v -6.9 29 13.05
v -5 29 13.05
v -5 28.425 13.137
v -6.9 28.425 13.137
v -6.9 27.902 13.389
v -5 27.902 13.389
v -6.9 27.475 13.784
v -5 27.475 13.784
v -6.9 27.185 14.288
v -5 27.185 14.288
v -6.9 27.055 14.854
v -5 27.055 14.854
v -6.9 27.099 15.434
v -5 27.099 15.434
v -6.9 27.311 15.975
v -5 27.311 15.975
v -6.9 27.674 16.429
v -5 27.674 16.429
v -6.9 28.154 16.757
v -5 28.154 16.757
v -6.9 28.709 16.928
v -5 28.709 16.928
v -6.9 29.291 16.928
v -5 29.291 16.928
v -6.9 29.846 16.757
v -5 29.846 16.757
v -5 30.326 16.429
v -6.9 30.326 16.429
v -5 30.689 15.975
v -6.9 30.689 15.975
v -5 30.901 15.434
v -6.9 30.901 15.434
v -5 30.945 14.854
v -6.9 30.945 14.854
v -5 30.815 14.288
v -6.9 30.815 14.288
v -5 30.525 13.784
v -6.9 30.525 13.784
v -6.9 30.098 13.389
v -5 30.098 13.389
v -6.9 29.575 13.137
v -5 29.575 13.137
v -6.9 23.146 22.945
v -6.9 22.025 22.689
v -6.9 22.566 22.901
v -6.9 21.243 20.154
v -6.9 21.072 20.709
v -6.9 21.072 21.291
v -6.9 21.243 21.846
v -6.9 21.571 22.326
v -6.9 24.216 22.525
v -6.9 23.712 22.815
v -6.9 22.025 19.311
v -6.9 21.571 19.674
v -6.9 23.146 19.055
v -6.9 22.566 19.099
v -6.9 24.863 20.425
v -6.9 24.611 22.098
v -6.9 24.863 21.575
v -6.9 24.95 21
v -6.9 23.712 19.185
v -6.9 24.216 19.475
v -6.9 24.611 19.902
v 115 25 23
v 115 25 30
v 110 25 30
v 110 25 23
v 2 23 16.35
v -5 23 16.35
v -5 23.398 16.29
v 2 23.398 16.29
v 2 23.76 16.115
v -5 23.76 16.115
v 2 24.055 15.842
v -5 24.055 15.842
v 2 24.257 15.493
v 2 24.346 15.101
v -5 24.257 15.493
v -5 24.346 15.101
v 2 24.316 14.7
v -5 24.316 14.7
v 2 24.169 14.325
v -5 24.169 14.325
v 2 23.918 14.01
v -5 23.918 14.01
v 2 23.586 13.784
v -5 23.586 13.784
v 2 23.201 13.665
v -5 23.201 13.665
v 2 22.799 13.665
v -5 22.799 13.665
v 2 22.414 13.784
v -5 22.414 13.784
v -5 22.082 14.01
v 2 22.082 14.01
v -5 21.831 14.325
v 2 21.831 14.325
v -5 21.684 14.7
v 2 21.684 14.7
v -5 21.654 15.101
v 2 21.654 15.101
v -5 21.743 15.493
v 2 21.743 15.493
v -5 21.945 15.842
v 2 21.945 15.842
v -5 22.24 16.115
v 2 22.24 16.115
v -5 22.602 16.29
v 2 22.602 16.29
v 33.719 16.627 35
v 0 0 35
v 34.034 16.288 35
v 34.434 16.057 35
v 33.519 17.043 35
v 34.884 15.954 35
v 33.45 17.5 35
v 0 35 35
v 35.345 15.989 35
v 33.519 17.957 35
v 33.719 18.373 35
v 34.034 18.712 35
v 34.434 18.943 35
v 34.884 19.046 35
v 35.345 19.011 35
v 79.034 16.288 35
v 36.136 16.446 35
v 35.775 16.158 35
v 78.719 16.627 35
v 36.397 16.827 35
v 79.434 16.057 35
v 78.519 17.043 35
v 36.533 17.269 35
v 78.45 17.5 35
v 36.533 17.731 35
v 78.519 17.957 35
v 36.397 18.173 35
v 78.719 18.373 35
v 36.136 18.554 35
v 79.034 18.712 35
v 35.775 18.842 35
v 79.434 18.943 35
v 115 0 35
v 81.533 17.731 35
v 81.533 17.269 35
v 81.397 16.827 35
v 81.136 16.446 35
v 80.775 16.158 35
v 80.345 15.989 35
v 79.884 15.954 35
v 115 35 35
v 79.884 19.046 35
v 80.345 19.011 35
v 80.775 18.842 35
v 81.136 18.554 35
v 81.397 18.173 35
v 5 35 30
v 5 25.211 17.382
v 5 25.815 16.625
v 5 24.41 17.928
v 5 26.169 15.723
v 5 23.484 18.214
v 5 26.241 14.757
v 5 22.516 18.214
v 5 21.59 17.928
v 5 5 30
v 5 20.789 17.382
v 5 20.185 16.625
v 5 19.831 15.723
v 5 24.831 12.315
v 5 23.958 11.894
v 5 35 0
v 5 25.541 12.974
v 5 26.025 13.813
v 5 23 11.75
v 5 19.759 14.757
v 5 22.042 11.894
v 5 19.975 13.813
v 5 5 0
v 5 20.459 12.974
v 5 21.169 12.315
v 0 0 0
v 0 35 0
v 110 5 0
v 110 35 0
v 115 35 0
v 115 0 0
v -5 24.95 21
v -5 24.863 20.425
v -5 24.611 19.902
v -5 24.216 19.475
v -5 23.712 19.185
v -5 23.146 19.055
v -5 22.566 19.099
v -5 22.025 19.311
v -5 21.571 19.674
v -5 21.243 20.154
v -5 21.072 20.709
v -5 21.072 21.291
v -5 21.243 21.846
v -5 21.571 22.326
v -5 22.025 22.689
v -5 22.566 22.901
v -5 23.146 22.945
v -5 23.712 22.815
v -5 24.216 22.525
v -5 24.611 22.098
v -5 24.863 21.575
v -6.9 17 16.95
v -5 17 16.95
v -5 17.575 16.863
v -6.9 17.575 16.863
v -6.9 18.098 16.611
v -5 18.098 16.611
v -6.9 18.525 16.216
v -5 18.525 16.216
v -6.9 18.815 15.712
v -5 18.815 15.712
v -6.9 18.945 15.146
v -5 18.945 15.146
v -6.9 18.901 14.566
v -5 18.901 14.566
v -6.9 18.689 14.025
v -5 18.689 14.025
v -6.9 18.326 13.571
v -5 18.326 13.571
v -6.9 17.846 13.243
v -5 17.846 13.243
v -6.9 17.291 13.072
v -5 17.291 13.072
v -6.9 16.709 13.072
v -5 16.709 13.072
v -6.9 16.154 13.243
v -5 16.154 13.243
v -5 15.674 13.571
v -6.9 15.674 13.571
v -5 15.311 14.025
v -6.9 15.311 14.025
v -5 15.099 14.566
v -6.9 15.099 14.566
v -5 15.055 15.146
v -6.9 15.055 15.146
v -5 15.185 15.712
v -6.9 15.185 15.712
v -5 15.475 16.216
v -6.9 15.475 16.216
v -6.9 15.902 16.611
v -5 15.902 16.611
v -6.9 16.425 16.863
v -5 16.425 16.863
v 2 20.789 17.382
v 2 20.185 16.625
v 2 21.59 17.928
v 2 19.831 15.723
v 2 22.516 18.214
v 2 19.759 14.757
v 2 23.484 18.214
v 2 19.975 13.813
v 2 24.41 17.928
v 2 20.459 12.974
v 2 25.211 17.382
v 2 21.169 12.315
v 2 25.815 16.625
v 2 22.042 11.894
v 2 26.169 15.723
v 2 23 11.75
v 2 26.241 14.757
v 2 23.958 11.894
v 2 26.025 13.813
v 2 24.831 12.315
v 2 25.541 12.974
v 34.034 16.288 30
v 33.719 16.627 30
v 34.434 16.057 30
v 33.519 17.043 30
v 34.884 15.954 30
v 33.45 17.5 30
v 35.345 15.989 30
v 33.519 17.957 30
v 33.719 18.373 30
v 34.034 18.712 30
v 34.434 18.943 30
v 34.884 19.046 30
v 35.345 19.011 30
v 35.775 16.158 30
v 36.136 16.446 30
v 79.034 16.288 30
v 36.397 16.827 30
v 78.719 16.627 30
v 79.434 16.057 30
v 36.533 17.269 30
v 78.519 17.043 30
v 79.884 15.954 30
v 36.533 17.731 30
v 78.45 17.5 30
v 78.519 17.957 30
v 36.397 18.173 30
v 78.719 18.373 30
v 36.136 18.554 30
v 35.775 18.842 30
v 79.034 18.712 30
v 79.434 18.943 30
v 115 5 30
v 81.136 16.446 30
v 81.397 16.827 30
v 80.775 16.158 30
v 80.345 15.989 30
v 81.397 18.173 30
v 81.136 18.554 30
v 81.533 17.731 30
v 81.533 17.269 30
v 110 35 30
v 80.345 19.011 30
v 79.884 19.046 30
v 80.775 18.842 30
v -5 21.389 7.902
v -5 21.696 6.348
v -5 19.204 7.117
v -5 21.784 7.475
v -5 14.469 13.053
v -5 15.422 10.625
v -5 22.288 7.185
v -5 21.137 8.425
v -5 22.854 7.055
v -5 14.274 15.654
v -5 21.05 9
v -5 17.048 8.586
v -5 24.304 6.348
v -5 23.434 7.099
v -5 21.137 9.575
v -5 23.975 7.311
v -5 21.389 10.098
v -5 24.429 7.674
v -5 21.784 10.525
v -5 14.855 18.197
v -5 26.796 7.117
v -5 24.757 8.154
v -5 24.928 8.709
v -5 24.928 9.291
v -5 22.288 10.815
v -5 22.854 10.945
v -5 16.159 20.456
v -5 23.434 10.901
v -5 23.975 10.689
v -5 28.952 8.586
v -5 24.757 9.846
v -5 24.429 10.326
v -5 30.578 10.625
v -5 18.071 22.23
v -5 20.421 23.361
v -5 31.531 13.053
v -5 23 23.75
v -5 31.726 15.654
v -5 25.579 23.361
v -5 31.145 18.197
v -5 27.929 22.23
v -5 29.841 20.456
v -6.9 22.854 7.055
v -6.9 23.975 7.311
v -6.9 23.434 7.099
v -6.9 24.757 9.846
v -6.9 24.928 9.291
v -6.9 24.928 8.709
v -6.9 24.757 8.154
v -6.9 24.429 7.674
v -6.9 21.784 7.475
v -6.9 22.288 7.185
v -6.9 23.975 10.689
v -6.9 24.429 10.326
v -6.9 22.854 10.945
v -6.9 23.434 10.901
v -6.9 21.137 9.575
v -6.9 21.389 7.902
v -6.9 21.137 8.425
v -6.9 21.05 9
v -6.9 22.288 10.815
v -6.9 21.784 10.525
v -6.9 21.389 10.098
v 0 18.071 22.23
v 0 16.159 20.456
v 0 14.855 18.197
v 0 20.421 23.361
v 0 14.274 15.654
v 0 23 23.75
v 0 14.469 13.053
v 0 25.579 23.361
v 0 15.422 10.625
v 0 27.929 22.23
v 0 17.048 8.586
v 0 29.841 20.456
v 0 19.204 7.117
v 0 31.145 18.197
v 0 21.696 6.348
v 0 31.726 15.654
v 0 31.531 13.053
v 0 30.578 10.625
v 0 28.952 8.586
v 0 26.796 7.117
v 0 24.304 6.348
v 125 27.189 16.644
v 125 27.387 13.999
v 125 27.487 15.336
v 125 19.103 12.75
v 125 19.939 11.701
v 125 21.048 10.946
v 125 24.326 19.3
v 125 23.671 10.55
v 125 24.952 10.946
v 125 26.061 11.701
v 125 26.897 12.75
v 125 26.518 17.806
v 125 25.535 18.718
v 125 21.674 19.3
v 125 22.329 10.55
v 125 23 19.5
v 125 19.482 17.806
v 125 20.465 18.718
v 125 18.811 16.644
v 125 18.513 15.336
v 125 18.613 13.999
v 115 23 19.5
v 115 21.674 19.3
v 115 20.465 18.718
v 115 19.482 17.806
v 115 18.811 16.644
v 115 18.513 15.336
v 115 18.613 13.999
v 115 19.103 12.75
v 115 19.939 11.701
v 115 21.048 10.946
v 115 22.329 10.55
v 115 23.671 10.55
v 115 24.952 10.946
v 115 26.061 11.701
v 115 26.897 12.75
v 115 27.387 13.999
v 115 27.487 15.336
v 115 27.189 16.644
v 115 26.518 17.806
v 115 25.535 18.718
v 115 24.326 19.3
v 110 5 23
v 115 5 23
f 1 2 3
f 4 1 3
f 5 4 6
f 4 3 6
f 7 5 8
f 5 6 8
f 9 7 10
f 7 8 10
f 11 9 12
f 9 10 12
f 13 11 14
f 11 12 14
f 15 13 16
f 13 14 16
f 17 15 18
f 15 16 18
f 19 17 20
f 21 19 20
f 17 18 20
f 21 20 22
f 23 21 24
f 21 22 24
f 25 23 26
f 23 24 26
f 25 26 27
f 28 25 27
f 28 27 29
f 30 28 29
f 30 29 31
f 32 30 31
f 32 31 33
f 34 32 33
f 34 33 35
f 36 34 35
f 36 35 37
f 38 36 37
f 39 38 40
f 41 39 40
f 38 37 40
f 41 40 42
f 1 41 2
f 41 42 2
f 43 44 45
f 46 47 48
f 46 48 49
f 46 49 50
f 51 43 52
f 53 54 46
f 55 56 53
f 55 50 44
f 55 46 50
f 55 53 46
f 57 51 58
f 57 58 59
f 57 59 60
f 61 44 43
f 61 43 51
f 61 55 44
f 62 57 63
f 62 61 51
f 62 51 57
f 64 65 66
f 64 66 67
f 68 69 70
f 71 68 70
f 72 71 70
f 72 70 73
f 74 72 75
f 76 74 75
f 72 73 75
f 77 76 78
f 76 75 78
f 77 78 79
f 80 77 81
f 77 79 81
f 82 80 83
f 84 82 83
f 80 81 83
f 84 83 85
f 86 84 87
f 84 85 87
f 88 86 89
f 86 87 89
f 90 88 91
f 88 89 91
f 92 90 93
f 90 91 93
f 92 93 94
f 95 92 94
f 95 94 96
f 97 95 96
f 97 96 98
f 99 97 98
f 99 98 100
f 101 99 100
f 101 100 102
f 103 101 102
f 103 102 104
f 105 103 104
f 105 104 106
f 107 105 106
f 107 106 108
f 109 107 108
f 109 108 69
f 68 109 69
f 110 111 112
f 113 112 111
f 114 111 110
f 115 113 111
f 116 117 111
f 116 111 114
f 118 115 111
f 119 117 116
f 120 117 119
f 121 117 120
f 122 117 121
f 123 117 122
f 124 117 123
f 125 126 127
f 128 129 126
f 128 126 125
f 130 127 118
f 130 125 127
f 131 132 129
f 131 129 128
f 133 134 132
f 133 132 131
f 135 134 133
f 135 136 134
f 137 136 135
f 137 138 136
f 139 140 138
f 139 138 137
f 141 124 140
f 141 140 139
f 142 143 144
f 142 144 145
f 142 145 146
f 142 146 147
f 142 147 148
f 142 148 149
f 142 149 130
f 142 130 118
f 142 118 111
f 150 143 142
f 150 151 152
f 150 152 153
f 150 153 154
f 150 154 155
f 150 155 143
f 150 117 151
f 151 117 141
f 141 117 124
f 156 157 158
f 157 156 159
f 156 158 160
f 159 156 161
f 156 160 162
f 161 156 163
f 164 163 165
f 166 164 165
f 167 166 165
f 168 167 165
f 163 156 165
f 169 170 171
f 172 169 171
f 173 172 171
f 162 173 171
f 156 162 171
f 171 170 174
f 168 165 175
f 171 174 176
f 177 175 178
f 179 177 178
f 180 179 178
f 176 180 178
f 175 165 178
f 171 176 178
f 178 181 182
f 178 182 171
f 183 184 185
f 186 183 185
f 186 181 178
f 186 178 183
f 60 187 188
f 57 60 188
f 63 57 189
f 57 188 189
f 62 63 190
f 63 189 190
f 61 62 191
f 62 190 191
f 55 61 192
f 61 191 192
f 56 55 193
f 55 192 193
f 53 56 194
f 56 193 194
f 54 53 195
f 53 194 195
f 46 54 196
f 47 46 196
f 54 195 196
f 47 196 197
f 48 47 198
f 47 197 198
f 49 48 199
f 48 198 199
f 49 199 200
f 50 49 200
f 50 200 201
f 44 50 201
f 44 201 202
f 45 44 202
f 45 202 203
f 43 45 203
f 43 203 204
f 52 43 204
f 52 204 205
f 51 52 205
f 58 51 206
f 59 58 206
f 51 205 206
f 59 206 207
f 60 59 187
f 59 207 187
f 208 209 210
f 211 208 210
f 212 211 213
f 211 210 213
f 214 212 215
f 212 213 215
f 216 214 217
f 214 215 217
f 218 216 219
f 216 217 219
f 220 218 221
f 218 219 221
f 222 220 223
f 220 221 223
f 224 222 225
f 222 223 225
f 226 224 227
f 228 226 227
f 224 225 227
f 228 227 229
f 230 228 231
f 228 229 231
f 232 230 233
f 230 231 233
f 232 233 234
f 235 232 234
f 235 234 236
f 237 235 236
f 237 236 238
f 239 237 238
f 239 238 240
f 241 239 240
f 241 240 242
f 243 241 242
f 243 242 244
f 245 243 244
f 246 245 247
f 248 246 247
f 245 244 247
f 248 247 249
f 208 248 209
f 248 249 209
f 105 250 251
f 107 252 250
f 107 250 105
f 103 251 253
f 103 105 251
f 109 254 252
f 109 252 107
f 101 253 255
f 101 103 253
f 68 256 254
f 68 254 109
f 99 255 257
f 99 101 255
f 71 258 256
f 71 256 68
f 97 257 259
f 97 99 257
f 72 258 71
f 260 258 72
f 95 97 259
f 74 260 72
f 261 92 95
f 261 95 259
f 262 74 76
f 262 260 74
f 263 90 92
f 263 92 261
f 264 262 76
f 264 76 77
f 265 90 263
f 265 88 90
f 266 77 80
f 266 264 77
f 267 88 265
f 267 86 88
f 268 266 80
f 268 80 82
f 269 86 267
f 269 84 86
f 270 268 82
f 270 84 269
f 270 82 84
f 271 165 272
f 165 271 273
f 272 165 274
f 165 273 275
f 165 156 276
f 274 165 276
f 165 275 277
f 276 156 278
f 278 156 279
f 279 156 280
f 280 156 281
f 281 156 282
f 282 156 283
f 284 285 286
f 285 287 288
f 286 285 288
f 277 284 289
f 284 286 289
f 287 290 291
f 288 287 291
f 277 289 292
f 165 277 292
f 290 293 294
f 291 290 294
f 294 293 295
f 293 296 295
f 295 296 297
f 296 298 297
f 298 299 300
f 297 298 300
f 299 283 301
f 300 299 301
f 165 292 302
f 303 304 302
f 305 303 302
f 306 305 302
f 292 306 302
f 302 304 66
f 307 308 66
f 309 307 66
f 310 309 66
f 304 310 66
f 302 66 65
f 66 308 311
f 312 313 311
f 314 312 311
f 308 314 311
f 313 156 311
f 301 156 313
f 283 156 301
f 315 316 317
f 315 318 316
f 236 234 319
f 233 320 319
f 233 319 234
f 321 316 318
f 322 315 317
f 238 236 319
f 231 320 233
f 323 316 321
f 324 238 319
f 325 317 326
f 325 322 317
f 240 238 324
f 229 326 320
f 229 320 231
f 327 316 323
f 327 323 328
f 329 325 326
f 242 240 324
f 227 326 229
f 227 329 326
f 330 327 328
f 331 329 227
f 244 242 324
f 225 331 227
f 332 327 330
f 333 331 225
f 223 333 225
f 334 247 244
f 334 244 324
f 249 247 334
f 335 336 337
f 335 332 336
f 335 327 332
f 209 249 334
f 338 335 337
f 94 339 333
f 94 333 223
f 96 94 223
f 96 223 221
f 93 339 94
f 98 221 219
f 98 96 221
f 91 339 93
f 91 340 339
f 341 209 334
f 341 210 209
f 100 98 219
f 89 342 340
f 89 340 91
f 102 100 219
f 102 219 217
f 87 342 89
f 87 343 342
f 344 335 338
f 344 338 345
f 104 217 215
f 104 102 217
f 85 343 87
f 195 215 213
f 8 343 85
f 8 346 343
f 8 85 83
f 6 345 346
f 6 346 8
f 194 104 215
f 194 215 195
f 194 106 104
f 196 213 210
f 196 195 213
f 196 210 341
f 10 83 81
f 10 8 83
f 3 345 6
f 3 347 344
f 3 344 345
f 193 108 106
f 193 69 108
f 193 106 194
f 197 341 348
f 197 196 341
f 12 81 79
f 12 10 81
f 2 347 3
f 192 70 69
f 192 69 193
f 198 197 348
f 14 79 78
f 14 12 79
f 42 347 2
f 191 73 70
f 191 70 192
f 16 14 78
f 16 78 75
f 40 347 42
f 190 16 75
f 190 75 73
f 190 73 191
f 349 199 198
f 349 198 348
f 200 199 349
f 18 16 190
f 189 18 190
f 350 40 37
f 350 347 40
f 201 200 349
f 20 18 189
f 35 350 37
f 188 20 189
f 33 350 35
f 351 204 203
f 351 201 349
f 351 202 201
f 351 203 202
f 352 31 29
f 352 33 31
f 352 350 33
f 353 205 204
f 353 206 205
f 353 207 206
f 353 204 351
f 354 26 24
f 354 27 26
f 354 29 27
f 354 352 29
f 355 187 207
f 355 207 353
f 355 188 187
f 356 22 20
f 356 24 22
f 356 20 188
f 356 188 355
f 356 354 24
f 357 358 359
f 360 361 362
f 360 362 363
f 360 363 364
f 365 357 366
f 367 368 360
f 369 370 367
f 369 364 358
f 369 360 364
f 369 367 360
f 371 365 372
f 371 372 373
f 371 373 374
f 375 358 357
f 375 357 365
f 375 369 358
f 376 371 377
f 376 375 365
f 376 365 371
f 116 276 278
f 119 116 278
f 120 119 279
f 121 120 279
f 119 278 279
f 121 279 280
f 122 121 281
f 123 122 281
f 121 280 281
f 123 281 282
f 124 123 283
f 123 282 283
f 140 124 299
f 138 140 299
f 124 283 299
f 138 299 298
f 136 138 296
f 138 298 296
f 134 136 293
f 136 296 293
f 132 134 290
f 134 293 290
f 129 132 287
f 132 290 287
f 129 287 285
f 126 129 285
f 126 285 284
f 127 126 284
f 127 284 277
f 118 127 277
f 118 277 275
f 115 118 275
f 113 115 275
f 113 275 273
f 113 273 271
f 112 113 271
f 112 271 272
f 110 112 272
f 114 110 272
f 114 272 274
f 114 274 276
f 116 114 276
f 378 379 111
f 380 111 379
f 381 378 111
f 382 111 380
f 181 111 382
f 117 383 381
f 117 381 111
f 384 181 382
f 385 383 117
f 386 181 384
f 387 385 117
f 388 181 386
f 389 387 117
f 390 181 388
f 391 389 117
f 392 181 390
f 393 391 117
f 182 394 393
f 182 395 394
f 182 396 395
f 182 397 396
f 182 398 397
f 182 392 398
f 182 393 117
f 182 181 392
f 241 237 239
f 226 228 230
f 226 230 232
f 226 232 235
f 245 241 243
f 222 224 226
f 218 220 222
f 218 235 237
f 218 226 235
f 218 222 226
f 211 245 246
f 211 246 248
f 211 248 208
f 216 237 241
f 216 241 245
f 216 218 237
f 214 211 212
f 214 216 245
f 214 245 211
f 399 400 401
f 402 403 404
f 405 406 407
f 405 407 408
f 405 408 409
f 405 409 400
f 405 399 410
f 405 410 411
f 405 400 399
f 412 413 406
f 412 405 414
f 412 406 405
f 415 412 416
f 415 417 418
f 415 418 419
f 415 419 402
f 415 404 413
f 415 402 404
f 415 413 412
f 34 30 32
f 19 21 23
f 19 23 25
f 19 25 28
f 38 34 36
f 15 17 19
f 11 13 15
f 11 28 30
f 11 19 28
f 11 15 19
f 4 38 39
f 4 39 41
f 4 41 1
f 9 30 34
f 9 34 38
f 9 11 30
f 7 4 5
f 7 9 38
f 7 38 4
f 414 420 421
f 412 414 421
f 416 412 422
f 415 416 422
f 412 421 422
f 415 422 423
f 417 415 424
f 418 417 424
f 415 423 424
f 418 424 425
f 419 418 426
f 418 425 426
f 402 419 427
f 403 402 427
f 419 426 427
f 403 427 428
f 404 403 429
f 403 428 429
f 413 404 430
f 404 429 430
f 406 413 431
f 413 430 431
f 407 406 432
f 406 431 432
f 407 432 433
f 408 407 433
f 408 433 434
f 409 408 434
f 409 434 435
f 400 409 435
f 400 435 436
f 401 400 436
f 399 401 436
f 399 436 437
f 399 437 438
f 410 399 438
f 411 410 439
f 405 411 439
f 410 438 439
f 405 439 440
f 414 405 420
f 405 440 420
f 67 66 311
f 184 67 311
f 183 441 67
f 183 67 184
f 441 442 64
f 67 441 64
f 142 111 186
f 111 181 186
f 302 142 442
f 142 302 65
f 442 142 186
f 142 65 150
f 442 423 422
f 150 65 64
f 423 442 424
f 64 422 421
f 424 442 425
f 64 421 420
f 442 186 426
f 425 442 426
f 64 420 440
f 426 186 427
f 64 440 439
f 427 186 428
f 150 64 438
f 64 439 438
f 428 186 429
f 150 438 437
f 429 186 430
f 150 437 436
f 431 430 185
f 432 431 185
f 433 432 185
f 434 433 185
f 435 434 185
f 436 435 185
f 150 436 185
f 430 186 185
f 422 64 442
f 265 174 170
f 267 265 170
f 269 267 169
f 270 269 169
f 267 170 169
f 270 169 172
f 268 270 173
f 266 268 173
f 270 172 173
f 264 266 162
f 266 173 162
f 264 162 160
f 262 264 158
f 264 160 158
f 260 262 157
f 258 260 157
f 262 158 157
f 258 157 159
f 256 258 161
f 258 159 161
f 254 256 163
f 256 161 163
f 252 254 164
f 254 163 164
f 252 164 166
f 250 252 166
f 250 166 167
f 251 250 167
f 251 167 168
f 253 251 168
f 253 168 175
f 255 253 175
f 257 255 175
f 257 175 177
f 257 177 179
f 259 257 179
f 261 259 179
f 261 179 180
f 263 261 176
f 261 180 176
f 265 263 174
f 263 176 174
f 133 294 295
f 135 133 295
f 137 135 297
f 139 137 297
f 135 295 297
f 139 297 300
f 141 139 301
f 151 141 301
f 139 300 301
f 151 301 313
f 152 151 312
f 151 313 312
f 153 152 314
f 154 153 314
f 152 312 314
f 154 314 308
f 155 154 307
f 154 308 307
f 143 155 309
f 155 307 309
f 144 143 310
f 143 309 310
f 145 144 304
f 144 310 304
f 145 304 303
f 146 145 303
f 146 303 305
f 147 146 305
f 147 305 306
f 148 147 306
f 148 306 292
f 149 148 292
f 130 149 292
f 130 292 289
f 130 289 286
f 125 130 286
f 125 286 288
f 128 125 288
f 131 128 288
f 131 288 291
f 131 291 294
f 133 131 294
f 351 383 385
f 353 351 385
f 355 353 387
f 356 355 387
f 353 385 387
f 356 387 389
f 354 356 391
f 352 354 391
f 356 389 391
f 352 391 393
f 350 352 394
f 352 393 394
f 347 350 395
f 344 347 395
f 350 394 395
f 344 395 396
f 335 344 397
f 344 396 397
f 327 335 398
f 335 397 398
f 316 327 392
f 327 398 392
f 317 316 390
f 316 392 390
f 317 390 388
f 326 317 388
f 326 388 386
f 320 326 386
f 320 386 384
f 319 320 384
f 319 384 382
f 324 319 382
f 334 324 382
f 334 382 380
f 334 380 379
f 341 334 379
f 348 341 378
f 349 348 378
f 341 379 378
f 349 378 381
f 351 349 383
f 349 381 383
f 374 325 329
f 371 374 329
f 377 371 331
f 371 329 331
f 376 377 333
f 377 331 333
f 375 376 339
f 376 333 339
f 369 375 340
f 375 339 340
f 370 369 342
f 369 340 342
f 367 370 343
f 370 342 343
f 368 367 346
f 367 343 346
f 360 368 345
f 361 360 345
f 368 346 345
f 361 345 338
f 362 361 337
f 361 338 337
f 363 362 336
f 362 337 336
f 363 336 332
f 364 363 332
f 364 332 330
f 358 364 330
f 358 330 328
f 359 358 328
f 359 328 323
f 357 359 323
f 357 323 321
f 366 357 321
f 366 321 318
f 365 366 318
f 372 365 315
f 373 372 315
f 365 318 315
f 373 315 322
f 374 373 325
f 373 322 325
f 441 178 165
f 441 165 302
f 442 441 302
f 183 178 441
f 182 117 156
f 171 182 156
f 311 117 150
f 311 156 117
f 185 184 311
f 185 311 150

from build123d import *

# Parameters (mm, degrees)
SKETCH1_W           = 115
SKETCH1_H           = 30
BOSS_EXTRUDE1_DEPTH = 5
SKETCH2_W           = 5
SKETCH2_H           = 30
BOSS_EXTRUDE2_DEPTH = 30
SKETCH3_R           = 8.75
BOSS_EXTRUDE3_DEPTH = 5
SKETCH4_R           = 1.95
BOSS_EXTRUDE4_DEPTH = 1.9
CIRPATTERN1_COUNT   = 4
SKETCH5_W           = 115
SKETCH5_H           = 35
BOSS_EXTRUDE5_DEPTH = 5
SKETCH6_R           = 1.55
CUT_EXTRUDE2_DEPTH  = 124.895116934
SKETCH7_R           = 1.35
CUT_EXTRUDE3_DEPTH  = 10
SKETCH8_R           = 3.25
CUT_EXTRUDE4_DEPTH  = 3
SKETCH9_W           = 7
SKETCH9_H           = 20
CUT_EXTRUDE5_DEPTH  = 5
SKETCH10_R          = 4.5
BOSS_EXTRUDE6_DEPTH = 10


with BuildPart() as part:
    # Sketch1 → Boss-Extrude1 (new body)
    with BuildSketch(Plane(origin=(0, 0, 0), x_dir=(1, 0, 0), z_dir=(0, 1, 0))):
        with Locations((57.5, -15)):
            Rectangle(SKETCH1_W, SKETCH1_H)
    extrude(amount=BOSS_EXTRUDE1_DEPTH)

    # Sketch2 → Boss-Extrude2 (add)
    with BuildSketch(Plane(origin=(0, 5, 0), x_dir=(1, 0, 0), z_dir=(0, 1, 0))):
        with Locations((2.5, -15)):
            Rectangle(SKETCH2_W, SKETCH2_H)
        with Locations((112.5, -15)):
            Rectangle(SKETCH2_W, SKETCH2_H)
    extrude(amount=BOSS_EXTRUDE2_DEPTH)

    # Sketch3 → Boss-Extrude3 (add)
    with BuildSketch(Plane.ZY):
        with Locations((15, 23)):
            Circle(SKETCH3_R)
    extrude(amount=BOSS_EXTRUDE3_DEPTH)

    # Sketch4 → Boss-Extrude4 (add)
    with BuildSketch(Plane.ZY.offset(5)):
        with Locations(Location((15, 29, 0), (0, 0, 180))):
            Circle(SKETCH4_R)
    boss_extrude4 = extrude(amount=BOSS_EXTRUDE4_DEPTH)

    # CirPattern1: Boss-Extrude4 ×4 about axis
    cirpattern1_axis = Axis((0, 23, 15), (1, 0, 0))
    for i in range(1, CIRPATTERN1_COUNT):
        add(boss_extrude4.rotate(cirpattern1_axis, i * 360 / CIRPATTERN1_COUNT))

    # Sketch5 → Boss-Extrude5 (add)
    with BuildSketch(Plane.XY.offset(30)):
        with Locations((57.5, 17.5)):
            Rectangle(SKETCH5_W, SKETCH5_H)
    extrude(amount=BOSS_EXTRUDE5_DEPTH)

    # Sketch6 → Cut-Extrude2 (cut, through all)
    with BuildSketch(Plane(origin=(0, 0, 30), x_dir=(-1, 0, 0), z_dir=(0, 0, -1))):
        with Locations((-80, 17.5)):
            Circle(SKETCH6_R)
        with Locations((-35, 17.5)):
            Circle(SKETCH6_R)
    extrude(amount=-CUT_EXTRUDE2_DEPTH, mode=Mode.SUBTRACT)

    # Sketch7 → Cut-Extrude3 (cut)
    with BuildSketch(Plane.ZY.offset(5)):
        with Locations((15, 23)):
            Circle(SKETCH7_R)
    extrude(amount=-CUT_EXTRUDE3_DEPTH, mode=Mode.SUBTRACT)

    # Sketch8 → Cut-Extrude4 (cut)
    with BuildSketch(Plane(origin=(5, 0, 0), x_dir=(0, 0, -1), z_dir=(1, 0, 0))):
        with Locations((-15, 23)):
            Circle(SKETCH8_R)
    extrude(amount=-CUT_EXTRUDE4_DEPTH, mode=Mode.SUBTRACT)

    # Sketch9 → Cut-Extrude5 (cut)
    with BuildSketch(Plane(origin=(115, 0, 0), x_dir=(0, 0, -1), z_dir=(1, 0, 0))):
        with Locations((-26.5, 15)):
            Rectangle(SKETCH9_W, SKETCH9_H)
    extrude(amount=-CUT_EXTRUDE5_DEPTH, mode=Mode.SUBTRACT)

    # Sketch10 → Boss-Extrude6 (add)
    with BuildSketch(Plane(origin=(115, 0, 0), x_dir=(0, 0, -1), z_dir=(1, 0, 0))):
        with Locations(Location((-15, 23, 0), (0, 0, 180))):
            Circle(SKETCH10_R)
    extrude(amount=BOSS_EXTRUDE6_DEPTH)


solid = part.part
